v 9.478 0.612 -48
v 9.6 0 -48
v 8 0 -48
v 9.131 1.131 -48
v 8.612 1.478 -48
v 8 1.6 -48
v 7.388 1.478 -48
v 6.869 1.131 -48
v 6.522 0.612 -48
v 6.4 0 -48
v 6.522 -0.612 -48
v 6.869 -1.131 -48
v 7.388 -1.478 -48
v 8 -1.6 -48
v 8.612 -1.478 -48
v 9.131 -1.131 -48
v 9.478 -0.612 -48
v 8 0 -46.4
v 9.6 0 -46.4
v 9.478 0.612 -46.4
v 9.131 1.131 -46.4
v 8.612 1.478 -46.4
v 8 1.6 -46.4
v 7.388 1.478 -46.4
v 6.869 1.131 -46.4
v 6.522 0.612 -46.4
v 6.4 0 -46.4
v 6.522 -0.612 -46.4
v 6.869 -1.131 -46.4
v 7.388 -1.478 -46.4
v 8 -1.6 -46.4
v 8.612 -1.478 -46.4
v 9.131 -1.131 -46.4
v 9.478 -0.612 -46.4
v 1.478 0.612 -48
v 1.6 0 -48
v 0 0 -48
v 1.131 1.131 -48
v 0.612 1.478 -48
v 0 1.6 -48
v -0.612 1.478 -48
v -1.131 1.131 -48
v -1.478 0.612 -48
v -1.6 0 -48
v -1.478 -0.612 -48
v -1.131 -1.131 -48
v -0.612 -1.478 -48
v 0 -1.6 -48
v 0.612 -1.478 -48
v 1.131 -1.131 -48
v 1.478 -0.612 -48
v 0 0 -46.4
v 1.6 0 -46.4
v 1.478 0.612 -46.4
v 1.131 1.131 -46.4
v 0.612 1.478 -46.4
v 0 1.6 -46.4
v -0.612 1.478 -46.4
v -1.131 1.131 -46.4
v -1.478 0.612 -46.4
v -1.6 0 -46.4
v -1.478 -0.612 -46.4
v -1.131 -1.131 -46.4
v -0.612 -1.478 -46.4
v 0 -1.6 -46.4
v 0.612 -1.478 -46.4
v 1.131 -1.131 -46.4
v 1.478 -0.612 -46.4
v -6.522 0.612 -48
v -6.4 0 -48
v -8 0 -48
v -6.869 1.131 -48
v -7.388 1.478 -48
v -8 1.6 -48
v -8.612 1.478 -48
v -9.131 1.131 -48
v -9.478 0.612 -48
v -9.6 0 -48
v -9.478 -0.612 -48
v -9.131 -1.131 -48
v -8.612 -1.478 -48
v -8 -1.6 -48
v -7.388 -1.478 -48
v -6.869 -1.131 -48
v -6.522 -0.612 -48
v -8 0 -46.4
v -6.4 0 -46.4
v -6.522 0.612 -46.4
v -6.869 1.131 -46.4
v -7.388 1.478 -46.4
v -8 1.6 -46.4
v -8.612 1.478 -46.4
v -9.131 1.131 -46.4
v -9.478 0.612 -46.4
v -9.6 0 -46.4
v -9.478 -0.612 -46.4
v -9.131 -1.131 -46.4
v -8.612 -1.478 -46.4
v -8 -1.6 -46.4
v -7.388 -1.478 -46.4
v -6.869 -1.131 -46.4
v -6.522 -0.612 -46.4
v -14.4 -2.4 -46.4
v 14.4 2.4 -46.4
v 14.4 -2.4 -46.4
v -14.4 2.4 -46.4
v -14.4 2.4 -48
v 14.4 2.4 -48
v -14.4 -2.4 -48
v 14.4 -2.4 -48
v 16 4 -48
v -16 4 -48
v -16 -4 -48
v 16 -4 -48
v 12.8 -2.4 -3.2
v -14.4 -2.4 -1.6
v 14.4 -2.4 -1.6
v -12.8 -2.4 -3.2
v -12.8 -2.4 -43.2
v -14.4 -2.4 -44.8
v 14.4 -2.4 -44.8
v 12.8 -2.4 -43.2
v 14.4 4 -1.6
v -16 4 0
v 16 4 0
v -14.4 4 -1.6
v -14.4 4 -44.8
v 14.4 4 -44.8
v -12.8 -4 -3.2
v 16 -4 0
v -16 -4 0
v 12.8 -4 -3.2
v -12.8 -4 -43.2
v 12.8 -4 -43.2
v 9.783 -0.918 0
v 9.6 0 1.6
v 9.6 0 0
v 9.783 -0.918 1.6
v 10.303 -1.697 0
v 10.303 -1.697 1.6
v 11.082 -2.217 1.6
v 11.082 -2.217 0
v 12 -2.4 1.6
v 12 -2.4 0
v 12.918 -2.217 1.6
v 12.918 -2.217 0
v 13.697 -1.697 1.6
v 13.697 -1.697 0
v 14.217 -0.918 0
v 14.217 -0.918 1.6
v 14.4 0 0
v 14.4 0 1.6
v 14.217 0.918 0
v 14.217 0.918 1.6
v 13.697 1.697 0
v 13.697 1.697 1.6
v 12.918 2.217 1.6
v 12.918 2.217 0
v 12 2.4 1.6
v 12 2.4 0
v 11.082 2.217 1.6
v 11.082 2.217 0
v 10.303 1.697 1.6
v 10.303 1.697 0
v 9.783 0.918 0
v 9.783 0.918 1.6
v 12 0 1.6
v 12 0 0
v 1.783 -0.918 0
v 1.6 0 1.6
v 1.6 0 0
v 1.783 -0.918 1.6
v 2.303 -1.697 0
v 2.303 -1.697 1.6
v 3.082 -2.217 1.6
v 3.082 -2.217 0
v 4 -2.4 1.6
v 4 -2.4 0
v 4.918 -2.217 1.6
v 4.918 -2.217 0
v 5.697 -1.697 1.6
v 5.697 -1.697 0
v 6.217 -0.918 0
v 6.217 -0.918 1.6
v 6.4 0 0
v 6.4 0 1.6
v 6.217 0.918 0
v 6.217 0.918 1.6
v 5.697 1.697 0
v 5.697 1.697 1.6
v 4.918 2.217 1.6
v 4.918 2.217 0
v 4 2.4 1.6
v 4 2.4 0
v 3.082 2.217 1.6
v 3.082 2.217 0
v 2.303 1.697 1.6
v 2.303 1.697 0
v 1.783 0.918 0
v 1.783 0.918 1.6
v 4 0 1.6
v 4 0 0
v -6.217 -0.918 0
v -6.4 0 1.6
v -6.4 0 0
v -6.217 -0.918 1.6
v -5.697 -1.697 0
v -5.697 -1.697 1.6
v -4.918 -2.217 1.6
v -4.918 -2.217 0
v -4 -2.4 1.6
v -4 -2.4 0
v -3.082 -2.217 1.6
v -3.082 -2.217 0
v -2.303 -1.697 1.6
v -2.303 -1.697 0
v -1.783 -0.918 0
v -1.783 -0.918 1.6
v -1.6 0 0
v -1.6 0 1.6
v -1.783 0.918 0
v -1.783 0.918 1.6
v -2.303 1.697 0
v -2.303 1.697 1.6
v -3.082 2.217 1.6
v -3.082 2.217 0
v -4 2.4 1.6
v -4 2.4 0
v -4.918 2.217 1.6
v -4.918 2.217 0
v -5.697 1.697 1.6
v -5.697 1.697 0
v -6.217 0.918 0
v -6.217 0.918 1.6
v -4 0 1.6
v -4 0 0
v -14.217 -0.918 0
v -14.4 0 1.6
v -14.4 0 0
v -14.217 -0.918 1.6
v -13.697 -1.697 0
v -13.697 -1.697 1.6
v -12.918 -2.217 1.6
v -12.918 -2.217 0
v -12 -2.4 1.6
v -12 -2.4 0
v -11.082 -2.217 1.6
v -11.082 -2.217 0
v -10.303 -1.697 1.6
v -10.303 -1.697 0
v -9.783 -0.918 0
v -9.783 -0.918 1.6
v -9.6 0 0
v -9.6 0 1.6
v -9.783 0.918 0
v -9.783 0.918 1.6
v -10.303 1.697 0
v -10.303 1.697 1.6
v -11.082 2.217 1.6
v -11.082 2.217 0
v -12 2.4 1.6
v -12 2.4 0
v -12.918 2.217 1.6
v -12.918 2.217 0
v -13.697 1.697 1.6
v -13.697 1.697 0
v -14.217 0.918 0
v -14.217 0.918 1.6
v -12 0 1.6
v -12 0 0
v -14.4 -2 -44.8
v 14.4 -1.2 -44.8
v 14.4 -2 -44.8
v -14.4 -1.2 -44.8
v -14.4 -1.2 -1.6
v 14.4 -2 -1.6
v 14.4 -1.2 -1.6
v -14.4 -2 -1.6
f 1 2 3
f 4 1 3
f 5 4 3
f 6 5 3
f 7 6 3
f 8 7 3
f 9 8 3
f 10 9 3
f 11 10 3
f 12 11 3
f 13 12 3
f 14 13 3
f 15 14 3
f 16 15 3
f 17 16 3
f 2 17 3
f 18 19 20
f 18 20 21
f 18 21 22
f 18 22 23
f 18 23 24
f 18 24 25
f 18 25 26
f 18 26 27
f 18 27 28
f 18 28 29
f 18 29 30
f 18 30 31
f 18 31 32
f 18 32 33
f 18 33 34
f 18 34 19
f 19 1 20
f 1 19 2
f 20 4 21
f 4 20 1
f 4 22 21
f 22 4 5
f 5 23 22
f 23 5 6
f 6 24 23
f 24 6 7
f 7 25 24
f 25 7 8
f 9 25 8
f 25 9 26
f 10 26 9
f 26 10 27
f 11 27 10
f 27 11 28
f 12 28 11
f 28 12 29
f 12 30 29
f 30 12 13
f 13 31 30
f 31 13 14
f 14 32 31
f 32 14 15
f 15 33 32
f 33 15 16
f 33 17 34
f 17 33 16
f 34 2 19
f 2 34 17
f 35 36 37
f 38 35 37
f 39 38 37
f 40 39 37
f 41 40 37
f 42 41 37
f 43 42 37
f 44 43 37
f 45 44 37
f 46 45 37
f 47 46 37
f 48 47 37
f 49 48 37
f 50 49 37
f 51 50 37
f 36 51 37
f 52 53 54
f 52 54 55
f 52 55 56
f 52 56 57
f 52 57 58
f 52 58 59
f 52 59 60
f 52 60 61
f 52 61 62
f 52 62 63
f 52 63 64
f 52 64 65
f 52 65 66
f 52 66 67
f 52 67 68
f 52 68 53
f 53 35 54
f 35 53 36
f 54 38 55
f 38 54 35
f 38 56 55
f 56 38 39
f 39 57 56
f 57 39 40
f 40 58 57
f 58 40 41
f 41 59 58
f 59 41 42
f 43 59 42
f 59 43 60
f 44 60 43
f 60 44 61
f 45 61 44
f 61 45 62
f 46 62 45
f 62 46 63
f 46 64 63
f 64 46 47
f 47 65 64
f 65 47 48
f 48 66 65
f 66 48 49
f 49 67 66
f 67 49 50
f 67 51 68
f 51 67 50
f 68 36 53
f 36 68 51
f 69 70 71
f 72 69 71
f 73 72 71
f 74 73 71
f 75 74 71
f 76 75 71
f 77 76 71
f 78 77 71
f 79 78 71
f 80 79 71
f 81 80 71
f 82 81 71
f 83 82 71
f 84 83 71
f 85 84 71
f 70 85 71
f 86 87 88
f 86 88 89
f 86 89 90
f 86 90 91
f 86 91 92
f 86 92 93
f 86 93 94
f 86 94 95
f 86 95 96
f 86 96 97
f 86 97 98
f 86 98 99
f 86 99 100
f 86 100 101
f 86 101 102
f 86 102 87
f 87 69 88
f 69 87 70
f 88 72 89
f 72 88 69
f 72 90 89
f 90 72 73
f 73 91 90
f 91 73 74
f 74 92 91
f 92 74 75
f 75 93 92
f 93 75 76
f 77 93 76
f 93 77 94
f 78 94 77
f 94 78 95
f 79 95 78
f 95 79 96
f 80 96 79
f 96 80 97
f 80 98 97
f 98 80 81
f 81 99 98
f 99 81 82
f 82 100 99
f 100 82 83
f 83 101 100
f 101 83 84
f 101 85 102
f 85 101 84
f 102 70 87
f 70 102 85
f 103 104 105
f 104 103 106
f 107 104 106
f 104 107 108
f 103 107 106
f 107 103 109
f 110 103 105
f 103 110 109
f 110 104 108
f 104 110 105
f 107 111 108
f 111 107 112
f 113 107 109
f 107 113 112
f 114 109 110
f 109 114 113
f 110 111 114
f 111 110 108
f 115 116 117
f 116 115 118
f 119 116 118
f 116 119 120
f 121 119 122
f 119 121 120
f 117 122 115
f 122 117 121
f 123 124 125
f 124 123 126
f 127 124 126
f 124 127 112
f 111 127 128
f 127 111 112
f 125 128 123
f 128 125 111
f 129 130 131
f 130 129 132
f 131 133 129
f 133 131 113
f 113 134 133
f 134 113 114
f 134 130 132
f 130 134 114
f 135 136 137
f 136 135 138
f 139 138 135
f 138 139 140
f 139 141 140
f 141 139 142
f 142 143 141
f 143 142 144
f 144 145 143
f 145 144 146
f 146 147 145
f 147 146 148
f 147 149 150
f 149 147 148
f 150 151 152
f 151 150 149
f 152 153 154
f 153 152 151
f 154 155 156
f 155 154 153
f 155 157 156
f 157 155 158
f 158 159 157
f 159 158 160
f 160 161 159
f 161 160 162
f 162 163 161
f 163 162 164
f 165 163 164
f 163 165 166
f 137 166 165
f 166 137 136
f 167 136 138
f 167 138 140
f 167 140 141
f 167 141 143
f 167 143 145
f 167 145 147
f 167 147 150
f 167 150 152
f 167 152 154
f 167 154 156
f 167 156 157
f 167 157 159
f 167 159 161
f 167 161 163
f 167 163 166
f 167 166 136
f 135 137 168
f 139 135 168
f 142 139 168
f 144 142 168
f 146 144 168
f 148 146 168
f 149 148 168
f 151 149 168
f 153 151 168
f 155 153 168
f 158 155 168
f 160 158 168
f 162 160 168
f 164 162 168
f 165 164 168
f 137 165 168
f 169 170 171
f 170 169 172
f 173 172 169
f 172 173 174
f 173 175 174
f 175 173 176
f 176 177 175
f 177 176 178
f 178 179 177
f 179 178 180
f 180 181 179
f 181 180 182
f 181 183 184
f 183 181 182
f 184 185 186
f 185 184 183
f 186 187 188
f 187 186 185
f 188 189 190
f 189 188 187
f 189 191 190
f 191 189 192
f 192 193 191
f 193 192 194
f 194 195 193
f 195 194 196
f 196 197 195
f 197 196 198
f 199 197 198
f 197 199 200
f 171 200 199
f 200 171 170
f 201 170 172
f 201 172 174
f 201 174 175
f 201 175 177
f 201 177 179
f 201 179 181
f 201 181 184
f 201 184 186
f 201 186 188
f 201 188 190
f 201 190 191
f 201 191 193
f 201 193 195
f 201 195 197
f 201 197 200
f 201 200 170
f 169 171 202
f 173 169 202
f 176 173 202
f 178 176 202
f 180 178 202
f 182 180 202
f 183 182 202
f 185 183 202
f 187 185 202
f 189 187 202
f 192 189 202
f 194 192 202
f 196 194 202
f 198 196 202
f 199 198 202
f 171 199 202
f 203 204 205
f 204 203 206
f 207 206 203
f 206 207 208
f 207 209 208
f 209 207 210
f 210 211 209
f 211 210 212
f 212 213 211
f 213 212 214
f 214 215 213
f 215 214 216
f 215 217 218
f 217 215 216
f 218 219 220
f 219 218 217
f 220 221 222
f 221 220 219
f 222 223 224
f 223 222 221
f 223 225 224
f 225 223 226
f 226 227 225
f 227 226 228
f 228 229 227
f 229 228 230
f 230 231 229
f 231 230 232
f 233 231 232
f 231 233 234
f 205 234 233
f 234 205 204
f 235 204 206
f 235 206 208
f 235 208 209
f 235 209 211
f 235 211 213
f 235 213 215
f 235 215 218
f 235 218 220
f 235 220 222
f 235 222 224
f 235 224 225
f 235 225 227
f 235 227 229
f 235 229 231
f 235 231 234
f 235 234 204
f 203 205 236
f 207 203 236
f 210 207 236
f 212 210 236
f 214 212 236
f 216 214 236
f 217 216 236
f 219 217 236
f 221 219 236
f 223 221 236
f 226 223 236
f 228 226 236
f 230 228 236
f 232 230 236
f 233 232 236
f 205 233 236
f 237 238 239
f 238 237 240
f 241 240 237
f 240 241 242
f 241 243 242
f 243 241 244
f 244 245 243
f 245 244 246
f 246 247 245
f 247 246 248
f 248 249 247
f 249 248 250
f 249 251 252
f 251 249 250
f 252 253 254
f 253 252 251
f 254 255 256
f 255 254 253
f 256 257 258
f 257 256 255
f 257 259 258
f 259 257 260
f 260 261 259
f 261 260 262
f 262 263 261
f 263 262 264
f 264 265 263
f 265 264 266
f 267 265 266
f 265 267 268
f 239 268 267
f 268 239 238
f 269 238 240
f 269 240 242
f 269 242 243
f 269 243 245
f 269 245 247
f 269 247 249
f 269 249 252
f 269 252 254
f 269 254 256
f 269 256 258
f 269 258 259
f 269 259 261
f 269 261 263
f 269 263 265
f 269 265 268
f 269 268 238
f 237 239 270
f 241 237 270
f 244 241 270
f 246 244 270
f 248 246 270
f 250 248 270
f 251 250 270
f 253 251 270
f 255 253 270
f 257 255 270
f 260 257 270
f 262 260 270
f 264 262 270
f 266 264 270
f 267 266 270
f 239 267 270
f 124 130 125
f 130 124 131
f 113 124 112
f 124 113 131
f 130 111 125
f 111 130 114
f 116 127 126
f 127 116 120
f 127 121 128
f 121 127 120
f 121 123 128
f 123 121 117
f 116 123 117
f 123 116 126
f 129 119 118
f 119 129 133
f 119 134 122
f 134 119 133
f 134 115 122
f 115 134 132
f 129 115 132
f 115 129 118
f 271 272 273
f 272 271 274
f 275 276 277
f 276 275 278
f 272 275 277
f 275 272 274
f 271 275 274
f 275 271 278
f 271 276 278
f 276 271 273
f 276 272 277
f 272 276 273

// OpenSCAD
// file: ../p/4-4edge.scad
use <../lib.scad>
function ldraw_lib__4_4edge() = [
// 0 Circle 1.0
// 0 Name: 4-4edge.dat
// 0 Author: James Jessiman
// 0 !LDRAW_ORG Primitive UPDATE 2017-01
// 0 !LICENSE Licensed under CC BY 2.0 and CC BY 4.0 : see CAreadme.txt
// 
// 0 BFC CERTIFY CCW
  [0,"BFC","CERTIFY"],
  [0,"BFC","CCW"],
// 
// 0 !HISTORY 1998-12-15 [PTadmin] Official Update 1998-10
// 0 !HISTORY 2005-12-28 [PTadmin] Official Update 2005-01
// 0 !HISTORY 2007-06-24 [PTadmin] Header formatted for Contributor Agreement
// 0 !HISTORY 2008-07-01 [PTadmin] Official Update 2008-01
// 0 !HISTORY 2017-01-15 [Steffen] BFCed
// 0 !HISTORY 2017-12-30 [PTadmin] Official Update 2017-01
// 
// 
// 2 24 1 0 0 0.9239 0 0.3827
  [2,24,1,0,0,0.9239,0,0.3827],
// 2 24 0.9239 0 0.3827 0.7071 0 0.7071
  [2,24,0.9239,0,0.3827,0.7071,0,0.7071],
// 2 24 0.7071 0 0.7071 0.3827 0 0.9239
  [2,24,0.7071,0,0.7071,0.3827,0,0.9239],
// 2 24 0.3827 0 0.9239 0 0 1
  [2,24,0.3827,0,0.9239,0,0,1],
// 2 24 0 0 1 -0.3827 0 0.9239
  [2,24,0,0,1,-0.3827,0,0.9239],
// 2 24 -0.3827 0 0.9239 -0.7071 0 0.7071
  [2,24,-0.3827,0,0.9239,-0.7071,0,0.7071],
// 2 24 -0.7071 0 0.7071 -0.9239 0 0.3827
  [2,24,-0.7071,0,0.7071,-0.9239,0,0.3827],
// 2 24 -0.9239 0 0.3827 -1 0 -0
  [2,24,-0.9239,0,0.3827,-1,0,-0],
// 2 24 -1 0 -0 -0.9239 0 -0.3827
  [2,24,-1,0,-0,-0.9239,0,-0.3827],
// 2 24 -0.9239 0 -0.3827 -0.7071 0 -0.7071
  [2,24,-0.9239,0,-0.3827,-0.7071,0,-0.7071],
// 2 24 -0.7071 0 -0.7071 -0.3827 0 -0.9239
  [2,24,-0.7071,0,-0.7071,-0.3827,0,-0.9239],
// 2 24 -0.3827 0 -0.9239 0 0 -1
  [2,24,-0.3827,0,-0.9239,0,0,-1],
// 2 24 0 0 -1 0.3827 0 -0.9239
  [2,24,0,0,-1,0.3827,0,-0.9239],
// 2 24 0.3827 0 -0.9239 0.7071 0 -0.7071
  [2,24,0.3827,0,-0.9239,0.7071,0,-0.7071],
// 2 24 0.7071 0 -0.7071 0.9239 0 -0.3827
  [2,24,0.7071,0,-0.7071,0.9239,0,-0.3827],
// 2 24 0.9239 0 -0.3827 1 0 0
  [2,24,0.9239,0,-0.3827,1,0,0],
];
module ldraw_lib__4_4edge(step=0, col=false, unit=2/5, alt=false, line=0.2, solid=!$preview)
    makepoly(ldraw_lib__4_4edge(), step=step, col=col, unit=unit, alt=alt, line=line, solid=solid);
ldraw_lib__4_4edge(line=0.2);
// file: ../p/4-4disc.scad
use <../lib.scad>
function ldraw_lib__4_4disc() = [
// 0 Disc 1.0
// 0 Name: 4-4disc.dat
// 0 Author: James Jessiman
// 0 !LDRAW_ORG Primitive UPDATE 2002-02
// 0 !LICENSE Licensed under CC BY 2.0 and CC BY 4.0 : see CAreadme.txt
// 
// 0 BFC CERTIFY CCW
  [0,"BFC","CERTIFY"],
  [0,"BFC","CCW"],
// 
// 0 !HISTORY 1998-12-15 [PTadmin] Official Update 1998-10
// 0 !HISTORY 2002-03-23 [sbliss] Added BFC statement
// 0 !HISTORY 2002-04-25 [PTadmin] Official Update 2002-02
// 0 !HISTORY 2007-06-24 [PTadmin] Header formatted for Contributor Agreement
// 0 !HISTORY 2008-07-01 [PTadmin] Official Update 2008-01
// 
// 
// 3 16 0 0 0 1 0 0 0.9239 0 0.3827
  [3,16,0,0,0,1,0,0,0.9239,0,0.3827],
// 3 16 0 0 0 0.9239 0 0.3827 0.7071 0 0.7071
  [3,16,0,0,0,0.9239,0,0.3827,0.7071,0,0.7071],
// 3 16 0 0 0 0.7071 0 0.7071 0.3827 0 0.9239
  [3,16,0,0,0,0.7071,0,0.7071,0.3827,0,0.9239],
// 3 16 0 0 0 0.3827 0 0.9239 0 0 1
  [3,16,0,0,0,0.3827,0,0.9239,0,0,1],
// 3 16 0 0 0 0 0 1 -0.3827 0 0.9239
  [3,16,0,0,0,0,0,1,-0.3827,0,0.9239],
// 3 16 0 0 0 -0.3827 0 0.9239 -0.7071 0 0.7071
  [3,16,0,0,0,-0.3827,0,0.9239,-0.7071,0,0.7071],
// 3 16 0 0 0 -0.7071 0 0.7071 -0.9239 0 0.3827
  [3,16,0,0,0,-0.7071,0,0.7071,-0.9239,0,0.3827],
// 3 16 0 0 0 -0.9239 0 0.3827 -1 0 -0
  [3,16,0,0,0,-0.9239,0,0.3827,-1,0,-0],
// 3 16 0 0 0 -1 0 -0 -0.9239 0 -0.3827
  [3,16,0,0,0,-1,0,-0,-0.9239,0,-0.3827],
// 3 16 0 0 0 -0.9239 0 -0.3827 -0.7071 0 -0.7071
  [3,16,0,0,0,-0.9239,0,-0.3827,-0.7071,0,-0.7071],
// 3 16 0 0 0 -0.7071 0 -0.7071 -0.3827 0 -0.9239
  [3,16,0,0,0,-0.7071,0,-0.7071,-0.3827,0,-0.9239],
// 3 16 0 0 0 -0.3827 0 -0.9239 0 0 -1
  [3,16,0,0,0,-0.3827,0,-0.9239,0,0,-1],
// 3 16 0 0 0 0 0 -1 0.3827 0 -0.9239
  [3,16,0,0,0,0,0,-1,0.3827,0,-0.9239],
// 3 16 0 0 0 0.3827 0 -0.9239 0.7071 0 -0.7071
  [3,16,0,0,0,0.3827,0,-0.9239,0.7071,0,-0.7071],
// 3 16 0 0 0 0.7071 0 -0.7071 0.9239 0 -0.3827
  [3,16,0,0,0,0.7071,0,-0.7071,0.9239,0,-0.3827],
// 3 16 0 0 0 0.9239 0 -0.3827 1 0 0
  [3,16,0,0,0,0.9239,0,-0.3827,1,0,0],
// 0
];
module ldraw_lib__4_4disc(step=0, col=false, unit=2/5, alt=false, line=0.2, solid=!$preview)
    makepoly(ldraw_lib__4_4disc(), step=step, col=col, unit=unit, alt=alt, line=line, solid=solid);
ldraw_lib__4_4disc(line=0.2);
// file: ../p/4-4cyli.scad
use <../lib.scad>
$fa=1; $fs=0.2;
function ldraw_lib__4_4cyli(realsolid=false) = [
// 0 Cylinder 1.0
// 0 Name: 4-4cyli.dat
// 0 Author: James Jessiman
// 0 !LDRAW_ORG Primitive UPDATE 2005-01
// 0 !LICENSE Licensed under CC BY 2.0 and CC BY 4.0 : see CAreadme.txt
// 
// 0 BFC CERTIFY CCW
  [0,"BFC","CERTIFY"],
  [0,"BFC","CCW"],
// 
// 0 !HISTORY 1998-12-15 [PTadmin] Official Update 1998-10
// 0 !HISTORY 2002-03-23 [sbliss] Added BFC statement; merged headers from files in distributions LDraw 0.27 and Complete.
// 0 !HISTORY 2002-04-25 [PTadmin] Official Update 2002-02
// 0 !HISTORY 2004-12-14 [guyvivan] BFC CCW
// 0 !HISTORY 2005-12-28 [PTadmin] Official Update 2005-01
// 0 !HISTORY 2007-06-24 [PTadmin] Header formatted for Contributor Agreement
// 0 !HISTORY 2008-07-01 [PTadmin] Official Update 2008-01
// 
// 
// 4 16 1 1 0 0.9239 1 0.3827 0.9239 0 0.3827 1 0 0
  [4,16,1,1,0,0.9239,1,0.3827,0.9239,0,0.3827,1,0,0],
// 5 24 1 0 0 1 1 0 0.9239 0 0.3827 0.9239 0 -0.3827
  [5,24,1,0,0,1,1,0,0.9239,0,0.3827,0.9239,0,-0.3827],
// 4 16 0.9239 1 0.3827 0.7071 1 0.7071 0.7071 0 0.7071 0.9239 0 0.3827
  [4,16,0.9239,1,0.3827,0.7071,1,0.7071,0.7071,0,0.7071,0.9239,0,0.3827],
// 5 24 0.9239 0 0.3827 0.9239 1 0.3827 0.7071 0 0.7071 1 0 0
  [5,24,0.9239,0,0.3827,0.9239,1,0.3827,0.7071,0,0.7071,1,0,0],
// 4 16 0.7071 1 0.7071 0.3827 1 0.9239 0.3827 0 0.9239 0.7071 0 0.7071
  [4,16,0.7071,1,0.7071,0.3827,1,0.9239,0.3827,0,0.9239,0.7071,0,0.7071],
// 5 24 0.7071 0 0.7071 0.7071 1 0.7071 0.3827 0 0.9239 0.9239 0 0.3827
  [5,24,0.7071,0,0.7071,0.7071,1,0.7071,0.3827,0,0.9239,0.9239,0,0.3827],
// 4 16 0.3827 1 0.9239 0 1 1 0 0 1 0.3827 0 0.9239
  [4,16,0.3827,1,0.9239,0,1,1,0,0,1,0.3827,0,0.9239],
// 5 24 0.3827 0 0.9239 0.3827 1 0.9239 0 0 1 0.7071 0 0.7071
  [5,24,0.3827,0,0.9239,0.3827,1,0.9239,0,0,1,0.7071,0,0.7071],
// 4 16 0 1 1 -0.3827 1 0.9239 -0.3827 0 0.9239 0 0 1
  [4,16,0,1,1,-0.3827,1,0.9239,-0.3827,0,0.9239,0,0,1],
// 5 24 0 0 1 0 1 1 -0.3827 0 0.9239 0.3827 0 0.9239
  [5,24,0,0,1,0,1,1,-0.3827,0,0.9239,0.3827,0,0.9239],
// 4 16 -0.3827 1 0.9239 -0.7071 1 0.7071 -0.7071 0 0.7071 -0.3827 0 0.9239
  [4,16,-0.3827,1,0.9239,-0.7071,1,0.7071,-0.7071,0,0.7071,-0.3827,0,0.9239],
// 5 24 -0.3827 0 0.9239 -0.3827 1 0.9239 -0.7071 0 0.7071 0 0 1
  [5,24,-0.3827,0,0.9239,-0.3827,1,0.9239,-0.7071,0,0.7071,0,0,1],
// 4 16 -0.7071 1 0.7071 -0.9239 1 0.3827 -0.9239 0 0.3827 -0.7071 0 0.7071
  [4,16,-0.7071,1,0.7071,-0.9239,1,0.3827,-0.9239,0,0.3827,-0.7071,0,0.7071],
// 5 24 -0.7071 0 0.7071 -0.7071 1 0.7071 -0.9239 0 0.3827 -0.3827 0 0.9239
  [5,24,-0.7071,0,0.7071,-0.7071,1,0.7071,-0.9239,0,0.3827,-0.3827,0,0.9239],
// 4 16 -0.9239 1 0.3827 -1 1 0 -1 0 0 -0.9239 0 0.3827
  [4,16,-0.9239,1,0.3827,-1,1,0,-1,0,0,-0.9239,0,0.3827],
// 5 24 -0.9239 0 0.3827 -0.9239 1 0.3827 -1 0 0 -0.7071 0 0.7071
  [5,24,-0.9239,0,0.3827,-0.9239,1,0.3827,-1,0,0,-0.7071,0,0.7071],
// 4 16 -1 1 0 -0.9239 1 -0.3827 -0.9239 0 -0.3827 -1 0 0
  [4,16,-1,1,0,-0.9239,1,-0.3827,-0.9239,0,-0.3827,-1,0,0],
// 5 24 -1 0 0 -1 1 0 -0.9239 0 -0.3827 -0.9239 0 0.3827
  [5,24,-1,0,0,-1,1,0,-0.9239,0,-0.3827,-0.9239,0,0.3827],
// 4 16 -0.9239 1 -0.3827 -0.7071 1 -0.7071 -0.7071 0 -0.7071 -0.9239 0 -0.3827
  [4,16,-0.9239,1,-0.3827,-0.7071,1,-0.7071,-0.7071,0,-0.7071,-0.9239,0,-0.3827],
// 5 24 -0.9239 0 -0.3827 -0.9239 1 -0.3827 -0.7071 0 -0.7071 -1 0 0
  [5,24,-0.9239,0,-0.3827,-0.9239,1,-0.3827,-0.7071,0,-0.7071,-1,0,0],
// 4 16 -0.7071 1 -0.7071 -0.3827 1 -0.9239 -0.3827 0 -0.9239 -0.7071 0 -0.7071
  [4,16,-0.7071,1,-0.7071,-0.3827,1,-0.9239,-0.3827,0,-0.9239,-0.7071,0,-0.7071],
// 5 24 -0.7071 0 -0.7071 -0.7071 1 -0.7071 -0.3827 0 -0.9239 -0.9239 0 -0.3827
  [5,24,-0.7071,0,-0.7071,-0.7071,1,-0.7071,-0.3827,0,-0.9239,-0.9239,0,-0.3827],
// 4 16 -0.3827 1 -0.9239 0 1 -1 0 0 -1 -0.3827 0 -0.9239
  [4,16,-0.3827,1,-0.9239,0,1,-1,0,0,-1,-0.3827,0,-0.9239],
// 5 24 -0.3827 0 -0.9239 -0.3827 1 -0.9239 0 0 -1 -0.7071 0 -0.7071
  [5,24,-0.3827,0,-0.9239,-0.3827,1,-0.9239,0,0,-1,-0.7071,0,-0.7071],
// 4 16 0 1 -1 0.3827 1 -0.9239 0.3827 0 -0.9239 0 0 -1
  [4,16,0,1,-1,0.3827,1,-0.9239,0.3827,0,-0.9239,0,0,-1],
// 5 24 0 0 -1 0 1 -1 0.3827 0 -0.9239 -0.3827 0 -0.9239
  [5,24,0,0,-1,0,1,-1,0.3827,0,-0.9239,-0.3827,0,-0.9239],
// 4 16 0.3827 1 -0.9239 0.7071 1 -0.7071 0.7071 0 -0.7071 0.3827 0 -0.9239
  [4,16,0.3827,1,-0.9239,0.7071,1,-0.7071,0.7071,0,-0.7071,0.3827,0,-0.9239],
// 5 24 0.3827 0 -0.9239 0.3827 1 -0.9239 0.7071 0 -0.7071 0 0 -1
  [5,24,0.3827,0,-0.9239,0.3827,1,-0.9239,0.7071,0,-0.7071,0,0,-1],
// 4 16 0.7071 1 -0.7071 0.9239 1 -0.3827 0.9239 0 -0.3827 0.7071 0 -0.7071
  [4,16,0.7071,1,-0.7071,0.9239,1,-0.3827,0.9239,0,-0.3827,0.7071,0,-0.7071],
// 5 24 0.7071 0 -0.7071 0.7071 1 -0.7071 0.9239 0 -0.3827 0.3827 0 -0.9239
  [5,24,0.7071,0,-0.7071,0.7071,1,-0.7071,0.9239,0,-0.3827,0.3827,0,-0.9239],
// 4 16 0.9239 1 -0.3827 1 1 0 1 0 0 0.9239 0 -0.3827
  [4,16,0.9239,1,-0.3827,1,1,0,1,0,0,0.9239,0,-0.3827],
// 5 24 0.9239 0 -0.3827 0.9239 1 -0.3827 1 0 0 0.7071 0 -0.7071
  [5,24,0.9239,0,-0.3827,0.9239,1,-0.3827,1,0,0,0.7071,0,-0.7071],
// 0
];
module ldraw_lib__4_4cyli(step=0, col=false, unit=2/5, alt=false, line=0.2, solid=!$preview)
    makepoly(ldraw_lib__4_4cyli(solid), step=step, col=col, unit=unit, alt=alt, line=line, solid=solid);
ldraw_lib__4_4cyli(line=0.2);
// file: ../p/box.scad
use <../lib.scad>
function ldraw_lib__box() = [
// 0 Box 6 (six faces)
// 0 Name: box.dat
// 0 Author: James Jessiman
// 0 !LDRAW_ORG Primitive UPDATE 2002-05
// 0 !LICENSE Licensed under CC BY 2.0 and CC BY 4.0 : see CAreadme.txt
// 
// 0 BFC CERTIFY CCW
  [0,"BFC","CERTIFY"],
  [0,"BFC","CCW"],
// 
// 0 !HISTORY 2002-08-22 [sbliss] Applied BFC
// 0 !HISTORY 2002-11-30 [PTadmin] Official Update 2002-05
// 0 !HISTORY 2007-06-24 [PTadmin] Header formatted for Contributor Agreement
// 0 !HISTORY 2008-07-01 [PTadmin] Official Update 2008-01
// 
// 
// 2 24 1 1 1 -1 1 1
  [2,24,1,1,1,-1,1,1],
// 2 24 -1 1 1 -1 1 -1
  [2,24,-1,1,1,-1,1,-1],
// 2 24 -1 1 -1 1 1 -1
  [2,24,-1,1,-1,1,1,-1],
// 2 24 1 1 -1 1 1 1
  [2,24,1,1,-1,1,1,1],
// 2 24 1 -1 1 -1 -1 1
  [2,24,1,-1,1,-1,-1,1],
// 2 24 -1 -1 1 -1 -1 -1
  [2,24,-1,-1,1,-1,-1,-1],
// 2 24 -1 -1 -1 1 -1 -1
  [2,24,-1,-1,-1,1,-1,-1],
// 2 24 1 -1 -1 1 -1 1
  [2,24,1,-1,-1,1,-1,1],
// 2 24 1 -1 1 1 1 1
  [2,24,1,-1,1,1,1,1],
// 2 24 -1 -1 1 -1 1 1
  [2,24,-1,-1,1,-1,1,1],
// 2 24 1 -1 -1 1 1 -1
  [2,24,1,-1,-1,1,1,-1],
// 2 24 -1 -1 -1 -1 1 -1
  [2,24,-1,-1,-1,-1,1,-1],
// 4 16 1 1 1 1 1 -1 -1 1 -1 -1 1 1
  [4,16,1,1,1,1,1,-1,-1,1,-1,-1,1,1],
// 4 16 -1 -1 -1 1 -1 -1 1 -1 1 -1 -1 1
  [4,16,-1,-1,-1,1,-1,-1,1,-1,1,-1,-1,1],
// 4 16 -1 -1 1 1 -1 1 1 1 1 -1 1 1
  [4,16,-1,-1,1,1,-1,1,1,1,1,-1,1,1],
// 4 16 -1 -1 -1 -1 -1 1 -1 1 1 -1 1 -1
  [4,16,-1,-1,-1,-1,-1,1,-1,1,1,-1,1,-1],
// 4 16 1 -1 -1 -1 -1 -1 -1 1 -1 1 1 -1
  [4,16,1,-1,-1,-1,-1,-1,-1,1,-1,1,1,-1],
// 4 16 1 -1 1 1 -1 -1 1 1 -1 1 1 1
  [4,16,1,-1,1,1,-1,-1,1,1,-1,1,1,1],
// 0
];
makepoly(ldraw_lib__box(), line=0.2);
// file: ../p/stud3.scad
use <../lib.scad>
use <4-4cyli.scad>
use <4-4disc.scad>
use <4-4edge.scad>
function ldraw_lib__stud3() = [
// 0 Stud Tube Solid
// 0 Name: stud3.dat
// 0 Author: James Jessiman
// 0 !LDRAW_ORG Primitive UPDATE 2012-01
// 0 !LICENSE Licensed under CC BY 4.0 : see CAreadme.txt
// 
// 0 BFC CERTIFY CCW
  [0,"BFC","CERTIFY"],
  [0,"BFC","CCW"],
// 
// 0 !HISTORY 2002-04-04 [sbliss] Modified for BFC compliance
// 0 !HISTORY 2002-04-25 [PTadmin] Official Update 2002-02
// 0 !HISTORY 2007-06-24 [PTadmin] Header formatted for Contributor Agreement
// 0 !HISTORY 2008-07-01 [PTadmin] Official Update 2008-01
// 0 !HISTORY 2012-02-16 [Philo] Changed to CCW
// 0 !HISTORY 2012-03-30 [PTadmin] Official Update 2012-01
// 
// 
// 1 16 0 -4 0 4 0 0 0 1 0 0 0 4 4-4edge.dat
  [1,16,0,-4,0,4,0,0,0,1,0,0,0,4, ldraw_lib__4_4edge()],
// 1 16 0 0 0 4 0 0 0 1 0 0 0 4 4-4edge.dat
  [1,16,0,0,0,4,0,0,0,1,0,0,0,4, ldraw_lib__4_4edge()],
// 1 16 0 -4 0 4 0 0 0 1 0 0 0 4 4-4disc.dat
  [1,16,0,-4,0,4,0,0,0,1,0,0,0,4, ldraw_lib__4_4disc()],
  [-1,16,0,0,0,4,0,0,0,-1,0,0,0,4, ldraw_lib__4_4disc()],
// 1 16 0 -4 0 4 0 0 0 4 0 0 0 4 4-4cyli.dat
  [1,16,0,-4,0,4,0,0,0,4,0,0,0,4, ldraw_lib__4_4cyli()],
];
module ldraw_lib__stud3(step=0, col=false, unit=2/5, alt=false, line=0.2, solid=!$preview)
    makepoly(ldraw_lib__stud3(), step=step, col=col, unit=unit, alt=alt, line=line, solid=solid);
ldraw_lib__stud3(line=0.2);
// file: ../p/stud.scad
use <../lib.scad>
use <4-4cyli.scad>
use <4-4disc.scad>
use <4-4edge.scad>
function ldraw_lib__stud() = [
// 0 Stud
// 0 Name: stud.dat
// 0 Author: James Jessiman
// 0 !LDRAW_ORG Primitive UPDATE 2012-01
// 0 !LICENSE Licensed under CC BY 4.0 : see CAreadme.txt
// 
// 0 BFC CERTIFY CCW
  [0,"BFC","CERTIFY"],
  [0,"BFC","CCW"],
// 
// 0 !HISTORY 2002-04-04 [sbliss] Modified for BFC compliance
// 0 !HISTORY 2002-04-25 [PTadmin] Official Update 2002-02
// 0 !HISTORY 2007-06-24 [PTadmin] Header formatted for Contributor Agreement
// 0 !HISTORY 2008-07-01 [PTadmin] Official Update 2008-01
// 0 !HISTORY 2012-02-16 [Philo] Changed to CCW
// 0 !HISTORY 2012-03-30 [PTadmin] Official Update 2012-01
// 
// 
// 1 16 0 0 0 6 0 0 0 1 0 0 0 6 4-4edge.dat
  [1,16,0,0,0,6,0,0,0,1,0,0,0,6, ldraw_lib__4_4edge()],
// 1 16 0 -4 0 6 0 0 0 1 0 0 0 6 4-4edge.dat
  [1,16,0,-4,0,6,0,0,0,1,0,0,0,6, ldraw_lib__4_4edge()],
// 1 16 0 0 0 6 0 0 0 -4 0 0 0 6 4-4cyli.dat
  [1,16,0,0,0,6,0,0,0,-4,0,0,0,6, ldraw_lib__4_4cyli()],
// 1 16 0 -4 0 6 0 0 0 1 0 0 0 6 4-4disc.dat
  [1,16,0,-4,0,6,0,0,0,1,0,0,0,6, ldraw_lib__4_4disc()],
  [-1,16,0,0,0,6,0,0,0,-1,0,0,0,6, ldraw_lib__4_4disc()],
];
module ldraw_lib__stud(step=0, col=false, unit=2/5, alt=false, line=0.2, solid=!$preview)
    makepoly(ldraw_lib__stud(), step=step, col=col, unit=unit, alt=alt, line=line, solid=solid);
ldraw_lib__stud(line=0.2);
// file: ../p/box5.scad
use <../lib.scad>
function ldraw_lib__box5() = [
// 0 Box with 5 Faces and All Edges
// 0 Name: box5.dat
// 0 Author: James Jessiman
// 0 !LDRAW_ORG Primitive UPDATE 2012-01
// 0 !LICENSE Licensed under CC BY 2.0 and CC BY 4.0 : see CAreadme.txt
// 
// 0 BFC CERTIFY CCW
  [0,"BFC","CERTIFY"],
  [0,"BFC","CCW"],
// 
// 0 !HISTORY 2002-04-03 [sbliss] Modified for BFC compliance
// 0 !HISTORY 2002-04-25 [PTadmin] Official Update 2002-02
// 0 !HISTORY 2007-06-24 [PTadmin] Header formatted for Contributor Agreement
// 0 !HISTORY 2008-07-01 [PTadmin] Official Update 2008-01
// 0 !HISTORY 2012-02-16 [Philo] Changed to CCW
// 0 !HISTORY 2012-03-30 [PTadmin] Official Update 2012-01
// 
// 
// 2 24 1 1 1 -1 1 1
  [2,24,1,1,1,-1,1,1],
// 2 24 -1 1 1 -1 1 -1
  [2,24,-1,1,1,-1,1,-1],
// 2 24 -1 1 -1 1 1 -1
  [2,24,-1,1,-1,1,1,-1],
// 2 24 1 1 -1 1 1 1
  [2,24,1,1,-1,1,1,1],
// 2 24 1 0 1 -1 0 1
  [2,24,1,0,1,-1,0,1],
// 2 24 -1 0 1 -1 0 -1
  [2,24,-1,0,1,-1,0,-1],
// 2 24 -1 0 -1 1 0 -1
  [2,24,-1,0,-1,1,0,-1],
// 2 24 1 0 -1 1 0 1
  [2,24,1,0,-1,1,0,1],
// 2 24 1 0 1 1 1 1
  [2,24,1,0,1,1,1,1],
// 2 24 -1 0 1 -1 1 1
  [2,24,-1,0,1,-1,1,1],
// 2 24 1 0 -1 1 1 -1
  [2,24,1,0,-1,1,1,-1],
// 2 24 -1 0 -1 -1 1 -1
  [2,24,-1,0,-1,-1,1,-1],
// 4 16 -1 1 1 1 1 1 1 1 -1 -1 1 -1
  [4,16,-1,1,1,1,1,1,1,1,-1,-1,1,-1],
// 4 16 -1 1 1 -1 0 1 1 0 1 1 1 1
  [4,16,-1,1,1,-1,0,1,1,0,1,1,1,1],
// 4 16 -1 1 -1 -1 0 -1 -1 0 1 -1 1 1
  [4,16,-1,1,-1,-1,0,-1,-1,0,1,-1,1,1],
// 4 16 1 1 -1 1 0 -1 -1 0 -1 -1 1 -1
  [4,16,1,1,-1,1,0,-1,-1,0,-1,-1,1,-1],
// 4 16 1 1 1 1 0 1 1 0 -1 1 1 -1
  [4,16,1,1,1,1,0,1,1,0,-1,1,1,-1],
];
makepoly(ldraw_lib__box5(), line=0.2);
// file: ../p/box4.scad
use <../lib.scad>
function ldraw_lib__box4() = [
// 0 Box with 4 Faces (2 Parallel Pairs) and All Edges
// 0 Name: box4.dat
// 0 Author: James Jessiman
// 0 !LDRAW_ORG Primitive UPDATE 2012-01
// 0 !LICENSE Licensed under CC BY 4.0 : see CAreadme.txt
// 
// 0 BFC CERTIFY CCW
  [0,"BFC","CERTIFY"],
  [0,"BFC","CCW"],
// 
// 0 !HISTORY 2002-04-03 [sbliss] Modified for BFC compliance
// 0 !HISTORY 2002-04-25 [PTadmin] Official Update 2002-02
// 0 !HISTORY 2007-06-24 [PTadmin] Header formatted for Contributor Agreement
// 0 !HISTORY 2008-07-01 [PTadmin] Official Update 2008-01
// 0 !HISTORY 2012-02-16 [Philo] Changed to CCW
// 0 !HISTORY 2012-03-30 [PTadmin] Official Update 2012-01
// 
// 
// 2 24 1 1 1 -1 1 1
  [2,24,1,1,1,-1,1,1],
// 2 24 -1 1 1 -1 1 -1
  [2,24,-1,1,1,-1,1,-1],
// 2 24 -1 1 -1 1 1 -1
  [2,24,-1,1,-1,1,1,-1],
// 2 24 1 1 -1 1 1 1
  [2,24,1,1,-1,1,1,1],
// 2 24 1 0 1 -1 0 1
  [2,24,1,0,1,-1,0,1],
// 2 24 -1 0 1 -1 0 -1
  [2,24,-1,0,1,-1,0,-1],
// 2 24 -1 0 -1 1 0 -1
  [2,24,-1,0,-1,1,0,-1],
// 2 24 1 0 -1 1 0 1
  [2,24,1,0,-1,1,0,1],
// 2 24 1 0 1 1 1 1
  [2,24,1,0,1,1,1,1],
// 2 24 -1 0 1 -1 1 1
  [2,24,-1,0,1,-1,1,1],
// 2 24 1 0 -1 1 1 -1
  [2,24,1,0,-1,1,1,-1],
// 2 24 -1 0 -1 -1 1 -1
  [2,24,-1,0,-1,-1,1,-1],
// 4 16 -1 1 1 -1 0 1 1 0 1 1 1 1
  [4,16,-1,1,1,-1,0,1,1,0,1,1,1,1],
// 4 16 -1 1 -1 -1 0 -1 -1 0 1 -1 1 1
  [4,16,-1,1,-1,-1,0,-1,-1,0,1,-1,1,1],
// 4 16 1 1 -1 1 0 -1 -1 0 -1 -1 1 -1
  [4,16,1,1,-1,1,0,-1,-1,0,-1,-1,1,-1],
// 4 16 1 1 1 1 0 1 1 0 -1 1 1 -1
  [4,16,1,1,1,1,0,1,1,0,-1,1,1,-1],
];
module ldraw_lib__box4(step=0, col=false, unit=2/5, alt=false, line=0.2, solid=!$preview)
    makepoly(ldraw_lib__box4(), step=step, col=col, unit=unit, alt=alt, line=line, solid=solid);
ldraw_lib__box4(line=0.2);
// file: ../p/box3u2p.scad
use <../lib.scad>
function ldraw_lib__box3u2p() = [
// 0 Box with 3 Faces without 2 Parallel Edges
// 0 Name: box3u2p.dat
// 0 Author: Niels Karsdorp [nielsk]
// 0 !LDRAW_ORG Primitive UPDATE 2012-01
// 0 !LICENSE Licensed under CC BY 2.0 and CC BY 4.0 : see CAreadme.txt
// 
// 0 BFC CERTIFY CCW
  [0,"BFC","CERTIFY"],
  [0,"BFC","CCW"],
// 
// 0 !HISTORY 2003-03-12 [PTadmin] Official Update 2003-01
// 0 !HISTORY 2007-06-24 [PTadmin] Header formatted for Contributor Agreement
// 0 !HISTORY 2008-07-01 [PTadmin] Official Update 2008-01
// 0 !HISTORY 2012-02-16 [Philo] Changed to CCW
// 0 !HISTORY 2012-03-30 [PTadmin] Official Update 2012-01
// 
// 
// 2 24 1 1 1 -1 1 1
  [2,24,1,1,1,-1,1,1],
// 2 24 -1 1 -1 1 1 -1
  [2,24,-1,1,-1,1,1,-1],
// 2 24 1 0 1 -1 0 1
  [2,24,1,0,1,-1,0,1],
// 2 24 -1 0 -1 1 0 -1
  [2,24,-1,0,-1,1,0,-1],
// 2 24 1 1 1 1 1 -1
  [2,24,1,1,1,1,1,-1],
// 2 24 -1 1 1 -1 1 -1
  [2,24,-1,1,1,-1,1,-1],
// 2 24 1 1 1 1 0 1
  [2,24,1,1,1,1,0,1],
// 2 24 1 1 -1 1 0 -1
  [2,24,1,1,-1,1,0,-1],
// 2 24 -1 1 1 -1 0 1
  [2,24,-1,1,1,-1,0,1],
// 2 24 -1 1 -1 -1 0 -1
  [2,24,-1,1,-1,-1,0,-1],
// 4 16 -1 1 -1 -1 1 1 1 1 1 1 1 -1
  [4,16,-1,1,-1,-1,1,1,1,1,1,1,1,-1],
// 4 16 -1 1 1 -1 0 1 1 0 1 1 1 1
  [4,16,-1,1,1,-1,0,1,1,0,1,1,1,1],
// 4 16 1 1 -1 1 0 -1 -1 0 -1 -1 1 -1
  [4,16,1,1,-1,1,0,-1,-1,0,-1,-1,1,-1],
];
module ldraw_lib__box3u2p(step=0, col=false, unit=2/5, alt=false, line=0.2, solid=!$preview)
    makepoly(ldraw_lib__box3u2p(), step=step, col=col, unit=unit, alt=alt, line=line, solid=solid);
ldraw_lib__box3u2p(line=0.2);
// file: 954.scad
use <../lib.scad>
use <../p/box.scad>
function ldraw_lib__954() = [
// 0 ~Glass for Window  1 x  4 x  5 with Fixed Glass
// 0 Name: 954.dat
// 0 Author: Alex Taylor [anathema]
// 0 !LDRAW_ORG Part UPDATE 2010-02
// 0 !LICENSE Licensed under CC BY 2.0 and CC BY 4.0 : see CAreadme.txt
// 
// 0 BFC CERTIFY CCW
  [0,"BFC","CERTIFY"],
  [0,"BFC","CCW"],
// 
// 0 !HISTORY 2010-07-05 [PTadmin] Official Update 2010-02
// 
// 
// 1 16 0 0 0 36 0 0 0 54 0 0 0 1 box.dat
  [1,16,0,0,0,36,0,0,0,54,0,0,0,1, ldraw_lib__box()],
// 0
];
module ldraw_lib__954(step=0, col=false, unit=2/5, alt=false, line=0.2, solid=!$preview)
    makepoly(ldraw_lib__954(), step=step, col=col, unit=unit, alt=alt, line=line, solid=solid);
ldraw_lib__954(line=0.2);
// file: 4347.scad
use <../lib.scad>
use <../p/box3u2p.scad>
use <../p/box4.scad>
use <../p/box5.scad>
use <../p/stud.scad>
use <../p/stud3.scad>
$fa=1; $fs=0.2;
function ldraw_lib__4347(realsolid=false) = [
// 0 ~Window  1 x  4 x  5 with Fixed Glass - Frame
// 0 Name: 4347.dat
// 0 Author: Alex Taylor [anathema]
// 0 !LDRAW_ORG Part UPDATE 2010-02
// 0 !LICENSE Licensed under CC BY 2.0 and CC BY 4.0 : see CAreadme.txt
// 
// 0 BFC CERTIFY CCW
  [0,"BFC","CERTIFY"],
  [0,"BFC","CCW"],
// 
// 0 !HISTORY 2010-07-05 [PTadmin] Official Update 2010-02
// 
// 
// 1 16 20 116 0 1 0 0 0 -1 0 0 0 1 stud3.dat
  [1,16,20,116,0,1,0,0,0,-1,0,0,0,1, ldraw_lib__stud3(realsolid)],
// 1 16 0 116 0 1 0 0 0 -1 0 0 0 1 stud3.dat
  [1,16,0,116,0,1,0,0,0,-1,0,0,0,1, ldraw_lib__stud3(realsolid)],
// 1 16 -20 116 0 1 0 0 0 -1 0 0 0 1 stud3.dat
  [1,16,-20,116,0,1,0,0,0,-1,0,0,0,1, ldraw_lib__stud3(realsolid)],
// 0 BFC INVERTNEXT
  [0,"BFC","INVERTNEXT"],
// 1 16 0 120 0 36 0 0 0 -4 0 0 0 6 box5.dat
  [1,16,0,120,0,36,0,0,0,-4,0,0,0,6, ldraw_lib__box5(realsolid)],
// 4 16 40 120 10 36 120 6 -36 120 6 -40 120 10
  [4,16,40,120,10,36,120,6,-36,120,6,-40,120,10],
// 4 16 -40 120 10 -36 120 6 -36 120 -6 -40 120 -10
  [4,16,-40,120,10,-36,120,6,-36,120,-6,-40,120,-10],
// 4 16 -40 120 -10 -36 120 -6 36 120 -6 40 120 -10
  [4,16,-40,120,-10,-36,120,-6,36,120,-6,40,120,-10],
// 4 16 40 120 -10 36 120 -6 36 120 6 40 120 10
  [4,16,40,120,-10,36,120,-6,36,120,6,40,120,10],
// 4 16 32 8 -6 -32 8 -6 -36 4 -6 36 4 -6
  [4,16,32,8,-6,-32,8,-6,-36,4,-6,36,4,-6],
// 4 16 -32 8 -6 -32 108 -6 -36 112 -6 -36 4 -6
  [4,16,-32,8,-6,-32,108,-6,-36,112,-6,-36,4,-6],
// 4 16 36 112 -6 -36 112 -6 -32 108 -6 32 108 -6
  [4,16,36,112,-6,-36,112,-6,-32,108,-6,32,108,-6],
// 4 16 36 4 -6 36 112 -6 32 108 -6 32 8 -6
  [4,16,36,4,-6,36,112,-6,32,108,-6,32,8,-6],
// 4 16 36 4 10 -36 4 10 -40 0 10 40 0 10
  [4,16,36,4,10,-36,4,10,-40,0,10,40,0,10],
// 4 16 -36 4 10 -36 112 10 -40 120 10 -40 0 10
  [4,16,-36,4,10,-36,112,10,-40,120,10,-40,0,10],
// 4 16 -36 112 10 36 112 10 40 120 10 -40 120 10
  [4,16,-36,112,10,36,112,10,40,120,10,-40,120,10],
// 4 16 40 0 10 40 120 10 36 112 10 36 4 10
  [4,16,40,0,10,40,120,10,36,112,10,36,4,10],
// 4 16 40 0 -10 -40 0 -10 -32 8 -10 32 8 -10
  [4,16,40,0,-10,-40,0,-10,-32,8,-10,32,8,-10],
// 4 16 -40 0 -10 -40 120 -10 -32 108 -10 -32 8 -10
  [4,16,-40,0,-10,-40,120,-10,-32,108,-10,-32,8,-10],
// 4 16 -40 120 -10 40 120 -10 32 108 -10 -32 108 -10
  [4,16,-40,120,-10,40,120,-10,32,108,-10,-32,108,-10],
// 4 16 32 8 -10 32 108 -10 40 120 -10 40 0 -10
  [4,16,32,8,-10,32,108,-10,40,120,-10,40,0,-10],
// 1 16 30 0 0 -1 0 0 0 1 0 0 0 -1 stud.dat
  [1,16,30,0,0,-1,0,0,0,1,0,0,0,-1, ldraw_lib__stud(realsolid)],
// 1 16 10 0 0 -1 0 0 0 1 0 0 0 -1 stud.dat
  [1,16,10,0,0,-1,0,0,0,1,0,0,0,-1, ldraw_lib__stud(realsolid)],
// 1 16 -10 0 0 -1 0 0 0 1 0 0 0 -1 stud.dat
  [1,16,-10,0,0,-1,0,0,0,1,0,0,0,-1, ldraw_lib__stud(realsolid)],
// 1 16 -30 0 0 -1 0 0 0 1 0 0 0 -1 stud.dat
  [1,16,-30,0,0,-1,0,0,0,1,0,0,0,-1, ldraw_lib__stud(realsolid)],
// 1 16 0 120 0 0 0 -40 0 -120 0 -10 0 0 box3u2p.dat
  [1,16,0,120,0,0,0,-40,0,-120,0,-10,0,0, ldraw_lib__box3u2p(realsolid)],
// 0 BFC INVERTNEXT
  [0,"BFC","INVERTNEXT"],
// 1 16 0 58 -6 0 0 -36 -54 0 0 0 16 0 box4.dat
  [1,16,0,58,-6,0,0,-36,-54,0,0,0,16,0, ldraw_lib__box4(realsolid)],
// 0 BFC INVERTNEXT
  [0,"BFC","INVERTNEXT"],
// 1 16 0 58 -10 0 0 -32 -50 0 0 0 4 0 box4.dat
  [1,16,0,58,-10,0,0,-32,-50,0,0,0,4,0, ldraw_lib__box4(realsolid)],
// 2 24 -40 120 -10 40 120 -10
  [2,24,-40,120,-10,40,120,-10],
// 2 24 -40 120 10 40 120 10
  [2,24,-40,120,10,40,120,10],
// 0
];
module ldraw_lib__4347(step=0, col=false, unit=2/5, alt=false, line=0.2, solid=!$preview)
    makepoly(ldraw_lib__4347(solid), step=step, col=col, unit=unit, alt=alt, line=line, solid=solid);
ldraw_lib__4347(line=0.2);
// main file
use <../lib.scad>
use <4347.scad>
use <954.scad>
function ldraw_lib__4347c01() = [
// 0 Window  1 x  4 x  5 with Fixed Glass (Complete)
// 0 Name: 4347c01.dat
// 0 Author: Alex Taylor [anathema]
// 0 !LDRAW_ORG Shortcut UPDATE 2010-02
// 0 !LICENSE Licensed under CC BY 4.0 : see CAreadme.txt
// 
// 0 BFC CERTIFY CCW
  [0,"BFC","CERTIFY"],
  [0,"BFC","CCW"],
// 
// 0 !KEYWORDS BrickLink 4347, Rebrickable 4347
// 
// 0 !HISTORY 2010-07-05 [PTadmin] Official Update 2010-02
// 
// 
// 1 16 0 0 0 1 0 0 0 1 0 0 0 1 4347.dat
  [1,16,0,0,0,1,0,0,0,1,0,0,0,1, ldraw_lib__4347()],
// 1 47 0 58 -4 1 0 0 0 1 0 0 0 1 954.dat
  [1,47,0,58,-4,1,0,0,0,1,0,0,0,1, ldraw_lib__954()],
// 0
];
module ldraw_lib__4347c01(step=0, col=false, unit=2/5, alt=false, line=0.2, solid=!$preview)
    makepoly(ldraw_lib__4347c01(), step=step, col=col, unit=unit, alt=alt, line=line, solid=solid);
ldraw_lib__4347c01(line=0.2);
